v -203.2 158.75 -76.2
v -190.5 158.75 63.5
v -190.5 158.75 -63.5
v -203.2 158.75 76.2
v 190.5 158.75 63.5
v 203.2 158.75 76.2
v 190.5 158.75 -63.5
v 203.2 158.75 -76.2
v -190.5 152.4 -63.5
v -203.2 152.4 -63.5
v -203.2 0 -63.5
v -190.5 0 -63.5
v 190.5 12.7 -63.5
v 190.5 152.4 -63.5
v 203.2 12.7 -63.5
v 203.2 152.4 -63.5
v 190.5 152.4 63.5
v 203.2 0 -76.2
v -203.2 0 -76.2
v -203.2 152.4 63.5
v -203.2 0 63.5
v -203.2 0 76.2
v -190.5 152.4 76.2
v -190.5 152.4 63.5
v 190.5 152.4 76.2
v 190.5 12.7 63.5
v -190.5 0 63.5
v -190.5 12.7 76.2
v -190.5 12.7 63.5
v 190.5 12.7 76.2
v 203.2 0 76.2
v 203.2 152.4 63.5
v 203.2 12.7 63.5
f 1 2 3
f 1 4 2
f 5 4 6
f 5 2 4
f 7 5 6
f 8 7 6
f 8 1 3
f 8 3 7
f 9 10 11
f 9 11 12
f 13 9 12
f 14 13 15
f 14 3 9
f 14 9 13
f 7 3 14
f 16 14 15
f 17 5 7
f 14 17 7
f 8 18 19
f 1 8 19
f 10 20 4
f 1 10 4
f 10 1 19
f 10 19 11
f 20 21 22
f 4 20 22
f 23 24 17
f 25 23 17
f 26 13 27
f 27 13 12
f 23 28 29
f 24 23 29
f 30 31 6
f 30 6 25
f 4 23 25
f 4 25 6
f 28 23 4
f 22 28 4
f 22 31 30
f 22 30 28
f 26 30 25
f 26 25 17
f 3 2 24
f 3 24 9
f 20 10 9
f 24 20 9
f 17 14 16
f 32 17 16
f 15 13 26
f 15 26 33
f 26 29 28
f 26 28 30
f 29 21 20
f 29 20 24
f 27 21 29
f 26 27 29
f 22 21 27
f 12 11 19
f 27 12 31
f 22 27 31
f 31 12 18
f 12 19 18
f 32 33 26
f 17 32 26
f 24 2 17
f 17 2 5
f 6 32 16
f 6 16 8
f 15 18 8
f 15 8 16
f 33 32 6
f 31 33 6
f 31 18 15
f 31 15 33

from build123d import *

# Parameters (mm, degrees)
SKETCH1_W                                  = 406.4
SKETCH1_H                                  = 152.4
SKETCH1_W_2                                = 381
SKETCH1_H_2                                = 127
BOSS_EXTRUDE1_DEPTH                        = 12.7
SKETCH2_W                                  = 12.7
SKETCH2_H                                  = 12.7
BOSS_EXTRUDE2_DEPTH                        = 146.05
MIRROR1_AT_THE_SECOND_PLANE_COPY_1_SKETC_W = 12.7
MIRROR1_AT_THE_SECOND_PLANE_COPY_1_SKETC_H = 12.7
MIRROR1_AT_THE_SECOND_PLANE_COPY_1_DEPTH   = 146.05
SKETCH3_W                                  = 406.4
SKETCH3_H                                  = 152.4
SKETCH3_W_2                                = 381
SKETCH3_H_2                                = 127
BOSS_EXTRUDE3_DEPTH                        = 6.35
SKETCH4_W                                  = 406.4
SKETCH4_H                                  = 158.75
BOSS_EXTRUDE4_DEPTH                        = 12.7
SKETCH6_W                                  = 12.7
SKETCH6_H                                  = 12.7
CUT_EXTRUDE1_DEPTH                         = 127
BOSS_EXTRUDE6_DEPTH                        = 127


with BuildPart() as part:
    # Sketch1 → Boss-Extrude1 (new body)
    with BuildSketch(Plane(origin=(0, 0, 0), x_dir=(1, 0, 0), z_dir=(0, 1, 0))):
        Rectangle(SKETCH1_W, SKETCH1_H)
        Rectangle(SKETCH1_W_2, SKETCH1_H_2, mode=Mode.SUBTRACT)
    extrude(amount=BOSS_EXTRUDE1_DEPTH)

    # Sketch2 → Boss-Extrude2 (add)
    with BuildSketch(Plane(origin=(0, 12.7, 0), x_dir=(1, 0, 0), z_dir=(0, 1, 0))):
        with Locations((-196.85, -69.85)):
            Rectangle(SKETCH2_W, SKETCH2_H)
    boss_extrude2 = extrude(amount=BOSS_EXTRUDE2_DEPTH)

    # Mirror1: Boss-Extrude2 across plane
    add(boss_extrude2.mirror(Plane(origin=(0, 0, 0), x_dir=(0, 0, 1), z_dir=(1, 0, 0))))

    # Mirror1 at the second plane: Boss-Extrude2 across plane
    add(boss_extrude2.mirror(Plane.XY))

    # Mirror1 at the second plane copy 1 sketc → Mirror1 at the second plane copy 1 (add)
    with BuildSketch(Plane(origin=(0, 12.7, 0), x_dir=(-1, 0, 0), z_dir=(0, 1, 0))):
        with Locations((-196.85, -69.85)):
            Rectangle(MIRROR1_AT_THE_SECOND_PLANE_COPY_1_SKETC_W, MIRROR1_AT_THE_SECOND_PLANE_COPY_1_SKETC_H)
    extrude(amount=MIRROR1_AT_THE_SECOND_PLANE_COPY_1_DEPTH)

    # Sketch3 → Boss-Extrude3 (add)
    with BuildSketch(Plane(origin=(0, 158.75, 0), x_dir=(1, 0, 0), z_dir=(0, 1, 0))):
        Rectangle(SKETCH3_W, SKETCH3_H)
        Rectangle(SKETCH3_W_2, SKETCH3_H_2, mode=Mode.SUBTRACT)
    extrude(amount=-BOSS_EXTRUDE3_DEPTH)

    # Sketch4 → Boss-Extrude4 (add)
    with BuildSketch(Plane(origin=(0, 0, -76.2), x_dir=(-1, 0, 0), z_dir=(0, 0, -1))):
        with Locations((0, 79.375)):
            Rectangle(SKETCH4_W, SKETCH4_H)
    extrude(amount=-BOSS_EXTRUDE4_DEPTH)

    # Sketch6 → Cut-Extrude1 (cut)
    with BuildSketch(Plane.XY.offset(-63.5)):
        with Locations((-196.85, 6.35)):
            Rectangle(SKETCH6_W, SKETCH6_H)
    extrude(amount=CUT_EXTRUDE1_DEPTH, mode=Mode.SUBTRACT)

    # Sketch5 → Boss-Extrude6 (add)
    with BuildSketch(Plane.XY.offset(-63.5)):
        Polygon((190.5, 12.7), (-190.5, 0), (190.5, 0), align=None)
    extrude(amount=BOSS_EXTRUDE6_DEPTH)


solid = part.part
